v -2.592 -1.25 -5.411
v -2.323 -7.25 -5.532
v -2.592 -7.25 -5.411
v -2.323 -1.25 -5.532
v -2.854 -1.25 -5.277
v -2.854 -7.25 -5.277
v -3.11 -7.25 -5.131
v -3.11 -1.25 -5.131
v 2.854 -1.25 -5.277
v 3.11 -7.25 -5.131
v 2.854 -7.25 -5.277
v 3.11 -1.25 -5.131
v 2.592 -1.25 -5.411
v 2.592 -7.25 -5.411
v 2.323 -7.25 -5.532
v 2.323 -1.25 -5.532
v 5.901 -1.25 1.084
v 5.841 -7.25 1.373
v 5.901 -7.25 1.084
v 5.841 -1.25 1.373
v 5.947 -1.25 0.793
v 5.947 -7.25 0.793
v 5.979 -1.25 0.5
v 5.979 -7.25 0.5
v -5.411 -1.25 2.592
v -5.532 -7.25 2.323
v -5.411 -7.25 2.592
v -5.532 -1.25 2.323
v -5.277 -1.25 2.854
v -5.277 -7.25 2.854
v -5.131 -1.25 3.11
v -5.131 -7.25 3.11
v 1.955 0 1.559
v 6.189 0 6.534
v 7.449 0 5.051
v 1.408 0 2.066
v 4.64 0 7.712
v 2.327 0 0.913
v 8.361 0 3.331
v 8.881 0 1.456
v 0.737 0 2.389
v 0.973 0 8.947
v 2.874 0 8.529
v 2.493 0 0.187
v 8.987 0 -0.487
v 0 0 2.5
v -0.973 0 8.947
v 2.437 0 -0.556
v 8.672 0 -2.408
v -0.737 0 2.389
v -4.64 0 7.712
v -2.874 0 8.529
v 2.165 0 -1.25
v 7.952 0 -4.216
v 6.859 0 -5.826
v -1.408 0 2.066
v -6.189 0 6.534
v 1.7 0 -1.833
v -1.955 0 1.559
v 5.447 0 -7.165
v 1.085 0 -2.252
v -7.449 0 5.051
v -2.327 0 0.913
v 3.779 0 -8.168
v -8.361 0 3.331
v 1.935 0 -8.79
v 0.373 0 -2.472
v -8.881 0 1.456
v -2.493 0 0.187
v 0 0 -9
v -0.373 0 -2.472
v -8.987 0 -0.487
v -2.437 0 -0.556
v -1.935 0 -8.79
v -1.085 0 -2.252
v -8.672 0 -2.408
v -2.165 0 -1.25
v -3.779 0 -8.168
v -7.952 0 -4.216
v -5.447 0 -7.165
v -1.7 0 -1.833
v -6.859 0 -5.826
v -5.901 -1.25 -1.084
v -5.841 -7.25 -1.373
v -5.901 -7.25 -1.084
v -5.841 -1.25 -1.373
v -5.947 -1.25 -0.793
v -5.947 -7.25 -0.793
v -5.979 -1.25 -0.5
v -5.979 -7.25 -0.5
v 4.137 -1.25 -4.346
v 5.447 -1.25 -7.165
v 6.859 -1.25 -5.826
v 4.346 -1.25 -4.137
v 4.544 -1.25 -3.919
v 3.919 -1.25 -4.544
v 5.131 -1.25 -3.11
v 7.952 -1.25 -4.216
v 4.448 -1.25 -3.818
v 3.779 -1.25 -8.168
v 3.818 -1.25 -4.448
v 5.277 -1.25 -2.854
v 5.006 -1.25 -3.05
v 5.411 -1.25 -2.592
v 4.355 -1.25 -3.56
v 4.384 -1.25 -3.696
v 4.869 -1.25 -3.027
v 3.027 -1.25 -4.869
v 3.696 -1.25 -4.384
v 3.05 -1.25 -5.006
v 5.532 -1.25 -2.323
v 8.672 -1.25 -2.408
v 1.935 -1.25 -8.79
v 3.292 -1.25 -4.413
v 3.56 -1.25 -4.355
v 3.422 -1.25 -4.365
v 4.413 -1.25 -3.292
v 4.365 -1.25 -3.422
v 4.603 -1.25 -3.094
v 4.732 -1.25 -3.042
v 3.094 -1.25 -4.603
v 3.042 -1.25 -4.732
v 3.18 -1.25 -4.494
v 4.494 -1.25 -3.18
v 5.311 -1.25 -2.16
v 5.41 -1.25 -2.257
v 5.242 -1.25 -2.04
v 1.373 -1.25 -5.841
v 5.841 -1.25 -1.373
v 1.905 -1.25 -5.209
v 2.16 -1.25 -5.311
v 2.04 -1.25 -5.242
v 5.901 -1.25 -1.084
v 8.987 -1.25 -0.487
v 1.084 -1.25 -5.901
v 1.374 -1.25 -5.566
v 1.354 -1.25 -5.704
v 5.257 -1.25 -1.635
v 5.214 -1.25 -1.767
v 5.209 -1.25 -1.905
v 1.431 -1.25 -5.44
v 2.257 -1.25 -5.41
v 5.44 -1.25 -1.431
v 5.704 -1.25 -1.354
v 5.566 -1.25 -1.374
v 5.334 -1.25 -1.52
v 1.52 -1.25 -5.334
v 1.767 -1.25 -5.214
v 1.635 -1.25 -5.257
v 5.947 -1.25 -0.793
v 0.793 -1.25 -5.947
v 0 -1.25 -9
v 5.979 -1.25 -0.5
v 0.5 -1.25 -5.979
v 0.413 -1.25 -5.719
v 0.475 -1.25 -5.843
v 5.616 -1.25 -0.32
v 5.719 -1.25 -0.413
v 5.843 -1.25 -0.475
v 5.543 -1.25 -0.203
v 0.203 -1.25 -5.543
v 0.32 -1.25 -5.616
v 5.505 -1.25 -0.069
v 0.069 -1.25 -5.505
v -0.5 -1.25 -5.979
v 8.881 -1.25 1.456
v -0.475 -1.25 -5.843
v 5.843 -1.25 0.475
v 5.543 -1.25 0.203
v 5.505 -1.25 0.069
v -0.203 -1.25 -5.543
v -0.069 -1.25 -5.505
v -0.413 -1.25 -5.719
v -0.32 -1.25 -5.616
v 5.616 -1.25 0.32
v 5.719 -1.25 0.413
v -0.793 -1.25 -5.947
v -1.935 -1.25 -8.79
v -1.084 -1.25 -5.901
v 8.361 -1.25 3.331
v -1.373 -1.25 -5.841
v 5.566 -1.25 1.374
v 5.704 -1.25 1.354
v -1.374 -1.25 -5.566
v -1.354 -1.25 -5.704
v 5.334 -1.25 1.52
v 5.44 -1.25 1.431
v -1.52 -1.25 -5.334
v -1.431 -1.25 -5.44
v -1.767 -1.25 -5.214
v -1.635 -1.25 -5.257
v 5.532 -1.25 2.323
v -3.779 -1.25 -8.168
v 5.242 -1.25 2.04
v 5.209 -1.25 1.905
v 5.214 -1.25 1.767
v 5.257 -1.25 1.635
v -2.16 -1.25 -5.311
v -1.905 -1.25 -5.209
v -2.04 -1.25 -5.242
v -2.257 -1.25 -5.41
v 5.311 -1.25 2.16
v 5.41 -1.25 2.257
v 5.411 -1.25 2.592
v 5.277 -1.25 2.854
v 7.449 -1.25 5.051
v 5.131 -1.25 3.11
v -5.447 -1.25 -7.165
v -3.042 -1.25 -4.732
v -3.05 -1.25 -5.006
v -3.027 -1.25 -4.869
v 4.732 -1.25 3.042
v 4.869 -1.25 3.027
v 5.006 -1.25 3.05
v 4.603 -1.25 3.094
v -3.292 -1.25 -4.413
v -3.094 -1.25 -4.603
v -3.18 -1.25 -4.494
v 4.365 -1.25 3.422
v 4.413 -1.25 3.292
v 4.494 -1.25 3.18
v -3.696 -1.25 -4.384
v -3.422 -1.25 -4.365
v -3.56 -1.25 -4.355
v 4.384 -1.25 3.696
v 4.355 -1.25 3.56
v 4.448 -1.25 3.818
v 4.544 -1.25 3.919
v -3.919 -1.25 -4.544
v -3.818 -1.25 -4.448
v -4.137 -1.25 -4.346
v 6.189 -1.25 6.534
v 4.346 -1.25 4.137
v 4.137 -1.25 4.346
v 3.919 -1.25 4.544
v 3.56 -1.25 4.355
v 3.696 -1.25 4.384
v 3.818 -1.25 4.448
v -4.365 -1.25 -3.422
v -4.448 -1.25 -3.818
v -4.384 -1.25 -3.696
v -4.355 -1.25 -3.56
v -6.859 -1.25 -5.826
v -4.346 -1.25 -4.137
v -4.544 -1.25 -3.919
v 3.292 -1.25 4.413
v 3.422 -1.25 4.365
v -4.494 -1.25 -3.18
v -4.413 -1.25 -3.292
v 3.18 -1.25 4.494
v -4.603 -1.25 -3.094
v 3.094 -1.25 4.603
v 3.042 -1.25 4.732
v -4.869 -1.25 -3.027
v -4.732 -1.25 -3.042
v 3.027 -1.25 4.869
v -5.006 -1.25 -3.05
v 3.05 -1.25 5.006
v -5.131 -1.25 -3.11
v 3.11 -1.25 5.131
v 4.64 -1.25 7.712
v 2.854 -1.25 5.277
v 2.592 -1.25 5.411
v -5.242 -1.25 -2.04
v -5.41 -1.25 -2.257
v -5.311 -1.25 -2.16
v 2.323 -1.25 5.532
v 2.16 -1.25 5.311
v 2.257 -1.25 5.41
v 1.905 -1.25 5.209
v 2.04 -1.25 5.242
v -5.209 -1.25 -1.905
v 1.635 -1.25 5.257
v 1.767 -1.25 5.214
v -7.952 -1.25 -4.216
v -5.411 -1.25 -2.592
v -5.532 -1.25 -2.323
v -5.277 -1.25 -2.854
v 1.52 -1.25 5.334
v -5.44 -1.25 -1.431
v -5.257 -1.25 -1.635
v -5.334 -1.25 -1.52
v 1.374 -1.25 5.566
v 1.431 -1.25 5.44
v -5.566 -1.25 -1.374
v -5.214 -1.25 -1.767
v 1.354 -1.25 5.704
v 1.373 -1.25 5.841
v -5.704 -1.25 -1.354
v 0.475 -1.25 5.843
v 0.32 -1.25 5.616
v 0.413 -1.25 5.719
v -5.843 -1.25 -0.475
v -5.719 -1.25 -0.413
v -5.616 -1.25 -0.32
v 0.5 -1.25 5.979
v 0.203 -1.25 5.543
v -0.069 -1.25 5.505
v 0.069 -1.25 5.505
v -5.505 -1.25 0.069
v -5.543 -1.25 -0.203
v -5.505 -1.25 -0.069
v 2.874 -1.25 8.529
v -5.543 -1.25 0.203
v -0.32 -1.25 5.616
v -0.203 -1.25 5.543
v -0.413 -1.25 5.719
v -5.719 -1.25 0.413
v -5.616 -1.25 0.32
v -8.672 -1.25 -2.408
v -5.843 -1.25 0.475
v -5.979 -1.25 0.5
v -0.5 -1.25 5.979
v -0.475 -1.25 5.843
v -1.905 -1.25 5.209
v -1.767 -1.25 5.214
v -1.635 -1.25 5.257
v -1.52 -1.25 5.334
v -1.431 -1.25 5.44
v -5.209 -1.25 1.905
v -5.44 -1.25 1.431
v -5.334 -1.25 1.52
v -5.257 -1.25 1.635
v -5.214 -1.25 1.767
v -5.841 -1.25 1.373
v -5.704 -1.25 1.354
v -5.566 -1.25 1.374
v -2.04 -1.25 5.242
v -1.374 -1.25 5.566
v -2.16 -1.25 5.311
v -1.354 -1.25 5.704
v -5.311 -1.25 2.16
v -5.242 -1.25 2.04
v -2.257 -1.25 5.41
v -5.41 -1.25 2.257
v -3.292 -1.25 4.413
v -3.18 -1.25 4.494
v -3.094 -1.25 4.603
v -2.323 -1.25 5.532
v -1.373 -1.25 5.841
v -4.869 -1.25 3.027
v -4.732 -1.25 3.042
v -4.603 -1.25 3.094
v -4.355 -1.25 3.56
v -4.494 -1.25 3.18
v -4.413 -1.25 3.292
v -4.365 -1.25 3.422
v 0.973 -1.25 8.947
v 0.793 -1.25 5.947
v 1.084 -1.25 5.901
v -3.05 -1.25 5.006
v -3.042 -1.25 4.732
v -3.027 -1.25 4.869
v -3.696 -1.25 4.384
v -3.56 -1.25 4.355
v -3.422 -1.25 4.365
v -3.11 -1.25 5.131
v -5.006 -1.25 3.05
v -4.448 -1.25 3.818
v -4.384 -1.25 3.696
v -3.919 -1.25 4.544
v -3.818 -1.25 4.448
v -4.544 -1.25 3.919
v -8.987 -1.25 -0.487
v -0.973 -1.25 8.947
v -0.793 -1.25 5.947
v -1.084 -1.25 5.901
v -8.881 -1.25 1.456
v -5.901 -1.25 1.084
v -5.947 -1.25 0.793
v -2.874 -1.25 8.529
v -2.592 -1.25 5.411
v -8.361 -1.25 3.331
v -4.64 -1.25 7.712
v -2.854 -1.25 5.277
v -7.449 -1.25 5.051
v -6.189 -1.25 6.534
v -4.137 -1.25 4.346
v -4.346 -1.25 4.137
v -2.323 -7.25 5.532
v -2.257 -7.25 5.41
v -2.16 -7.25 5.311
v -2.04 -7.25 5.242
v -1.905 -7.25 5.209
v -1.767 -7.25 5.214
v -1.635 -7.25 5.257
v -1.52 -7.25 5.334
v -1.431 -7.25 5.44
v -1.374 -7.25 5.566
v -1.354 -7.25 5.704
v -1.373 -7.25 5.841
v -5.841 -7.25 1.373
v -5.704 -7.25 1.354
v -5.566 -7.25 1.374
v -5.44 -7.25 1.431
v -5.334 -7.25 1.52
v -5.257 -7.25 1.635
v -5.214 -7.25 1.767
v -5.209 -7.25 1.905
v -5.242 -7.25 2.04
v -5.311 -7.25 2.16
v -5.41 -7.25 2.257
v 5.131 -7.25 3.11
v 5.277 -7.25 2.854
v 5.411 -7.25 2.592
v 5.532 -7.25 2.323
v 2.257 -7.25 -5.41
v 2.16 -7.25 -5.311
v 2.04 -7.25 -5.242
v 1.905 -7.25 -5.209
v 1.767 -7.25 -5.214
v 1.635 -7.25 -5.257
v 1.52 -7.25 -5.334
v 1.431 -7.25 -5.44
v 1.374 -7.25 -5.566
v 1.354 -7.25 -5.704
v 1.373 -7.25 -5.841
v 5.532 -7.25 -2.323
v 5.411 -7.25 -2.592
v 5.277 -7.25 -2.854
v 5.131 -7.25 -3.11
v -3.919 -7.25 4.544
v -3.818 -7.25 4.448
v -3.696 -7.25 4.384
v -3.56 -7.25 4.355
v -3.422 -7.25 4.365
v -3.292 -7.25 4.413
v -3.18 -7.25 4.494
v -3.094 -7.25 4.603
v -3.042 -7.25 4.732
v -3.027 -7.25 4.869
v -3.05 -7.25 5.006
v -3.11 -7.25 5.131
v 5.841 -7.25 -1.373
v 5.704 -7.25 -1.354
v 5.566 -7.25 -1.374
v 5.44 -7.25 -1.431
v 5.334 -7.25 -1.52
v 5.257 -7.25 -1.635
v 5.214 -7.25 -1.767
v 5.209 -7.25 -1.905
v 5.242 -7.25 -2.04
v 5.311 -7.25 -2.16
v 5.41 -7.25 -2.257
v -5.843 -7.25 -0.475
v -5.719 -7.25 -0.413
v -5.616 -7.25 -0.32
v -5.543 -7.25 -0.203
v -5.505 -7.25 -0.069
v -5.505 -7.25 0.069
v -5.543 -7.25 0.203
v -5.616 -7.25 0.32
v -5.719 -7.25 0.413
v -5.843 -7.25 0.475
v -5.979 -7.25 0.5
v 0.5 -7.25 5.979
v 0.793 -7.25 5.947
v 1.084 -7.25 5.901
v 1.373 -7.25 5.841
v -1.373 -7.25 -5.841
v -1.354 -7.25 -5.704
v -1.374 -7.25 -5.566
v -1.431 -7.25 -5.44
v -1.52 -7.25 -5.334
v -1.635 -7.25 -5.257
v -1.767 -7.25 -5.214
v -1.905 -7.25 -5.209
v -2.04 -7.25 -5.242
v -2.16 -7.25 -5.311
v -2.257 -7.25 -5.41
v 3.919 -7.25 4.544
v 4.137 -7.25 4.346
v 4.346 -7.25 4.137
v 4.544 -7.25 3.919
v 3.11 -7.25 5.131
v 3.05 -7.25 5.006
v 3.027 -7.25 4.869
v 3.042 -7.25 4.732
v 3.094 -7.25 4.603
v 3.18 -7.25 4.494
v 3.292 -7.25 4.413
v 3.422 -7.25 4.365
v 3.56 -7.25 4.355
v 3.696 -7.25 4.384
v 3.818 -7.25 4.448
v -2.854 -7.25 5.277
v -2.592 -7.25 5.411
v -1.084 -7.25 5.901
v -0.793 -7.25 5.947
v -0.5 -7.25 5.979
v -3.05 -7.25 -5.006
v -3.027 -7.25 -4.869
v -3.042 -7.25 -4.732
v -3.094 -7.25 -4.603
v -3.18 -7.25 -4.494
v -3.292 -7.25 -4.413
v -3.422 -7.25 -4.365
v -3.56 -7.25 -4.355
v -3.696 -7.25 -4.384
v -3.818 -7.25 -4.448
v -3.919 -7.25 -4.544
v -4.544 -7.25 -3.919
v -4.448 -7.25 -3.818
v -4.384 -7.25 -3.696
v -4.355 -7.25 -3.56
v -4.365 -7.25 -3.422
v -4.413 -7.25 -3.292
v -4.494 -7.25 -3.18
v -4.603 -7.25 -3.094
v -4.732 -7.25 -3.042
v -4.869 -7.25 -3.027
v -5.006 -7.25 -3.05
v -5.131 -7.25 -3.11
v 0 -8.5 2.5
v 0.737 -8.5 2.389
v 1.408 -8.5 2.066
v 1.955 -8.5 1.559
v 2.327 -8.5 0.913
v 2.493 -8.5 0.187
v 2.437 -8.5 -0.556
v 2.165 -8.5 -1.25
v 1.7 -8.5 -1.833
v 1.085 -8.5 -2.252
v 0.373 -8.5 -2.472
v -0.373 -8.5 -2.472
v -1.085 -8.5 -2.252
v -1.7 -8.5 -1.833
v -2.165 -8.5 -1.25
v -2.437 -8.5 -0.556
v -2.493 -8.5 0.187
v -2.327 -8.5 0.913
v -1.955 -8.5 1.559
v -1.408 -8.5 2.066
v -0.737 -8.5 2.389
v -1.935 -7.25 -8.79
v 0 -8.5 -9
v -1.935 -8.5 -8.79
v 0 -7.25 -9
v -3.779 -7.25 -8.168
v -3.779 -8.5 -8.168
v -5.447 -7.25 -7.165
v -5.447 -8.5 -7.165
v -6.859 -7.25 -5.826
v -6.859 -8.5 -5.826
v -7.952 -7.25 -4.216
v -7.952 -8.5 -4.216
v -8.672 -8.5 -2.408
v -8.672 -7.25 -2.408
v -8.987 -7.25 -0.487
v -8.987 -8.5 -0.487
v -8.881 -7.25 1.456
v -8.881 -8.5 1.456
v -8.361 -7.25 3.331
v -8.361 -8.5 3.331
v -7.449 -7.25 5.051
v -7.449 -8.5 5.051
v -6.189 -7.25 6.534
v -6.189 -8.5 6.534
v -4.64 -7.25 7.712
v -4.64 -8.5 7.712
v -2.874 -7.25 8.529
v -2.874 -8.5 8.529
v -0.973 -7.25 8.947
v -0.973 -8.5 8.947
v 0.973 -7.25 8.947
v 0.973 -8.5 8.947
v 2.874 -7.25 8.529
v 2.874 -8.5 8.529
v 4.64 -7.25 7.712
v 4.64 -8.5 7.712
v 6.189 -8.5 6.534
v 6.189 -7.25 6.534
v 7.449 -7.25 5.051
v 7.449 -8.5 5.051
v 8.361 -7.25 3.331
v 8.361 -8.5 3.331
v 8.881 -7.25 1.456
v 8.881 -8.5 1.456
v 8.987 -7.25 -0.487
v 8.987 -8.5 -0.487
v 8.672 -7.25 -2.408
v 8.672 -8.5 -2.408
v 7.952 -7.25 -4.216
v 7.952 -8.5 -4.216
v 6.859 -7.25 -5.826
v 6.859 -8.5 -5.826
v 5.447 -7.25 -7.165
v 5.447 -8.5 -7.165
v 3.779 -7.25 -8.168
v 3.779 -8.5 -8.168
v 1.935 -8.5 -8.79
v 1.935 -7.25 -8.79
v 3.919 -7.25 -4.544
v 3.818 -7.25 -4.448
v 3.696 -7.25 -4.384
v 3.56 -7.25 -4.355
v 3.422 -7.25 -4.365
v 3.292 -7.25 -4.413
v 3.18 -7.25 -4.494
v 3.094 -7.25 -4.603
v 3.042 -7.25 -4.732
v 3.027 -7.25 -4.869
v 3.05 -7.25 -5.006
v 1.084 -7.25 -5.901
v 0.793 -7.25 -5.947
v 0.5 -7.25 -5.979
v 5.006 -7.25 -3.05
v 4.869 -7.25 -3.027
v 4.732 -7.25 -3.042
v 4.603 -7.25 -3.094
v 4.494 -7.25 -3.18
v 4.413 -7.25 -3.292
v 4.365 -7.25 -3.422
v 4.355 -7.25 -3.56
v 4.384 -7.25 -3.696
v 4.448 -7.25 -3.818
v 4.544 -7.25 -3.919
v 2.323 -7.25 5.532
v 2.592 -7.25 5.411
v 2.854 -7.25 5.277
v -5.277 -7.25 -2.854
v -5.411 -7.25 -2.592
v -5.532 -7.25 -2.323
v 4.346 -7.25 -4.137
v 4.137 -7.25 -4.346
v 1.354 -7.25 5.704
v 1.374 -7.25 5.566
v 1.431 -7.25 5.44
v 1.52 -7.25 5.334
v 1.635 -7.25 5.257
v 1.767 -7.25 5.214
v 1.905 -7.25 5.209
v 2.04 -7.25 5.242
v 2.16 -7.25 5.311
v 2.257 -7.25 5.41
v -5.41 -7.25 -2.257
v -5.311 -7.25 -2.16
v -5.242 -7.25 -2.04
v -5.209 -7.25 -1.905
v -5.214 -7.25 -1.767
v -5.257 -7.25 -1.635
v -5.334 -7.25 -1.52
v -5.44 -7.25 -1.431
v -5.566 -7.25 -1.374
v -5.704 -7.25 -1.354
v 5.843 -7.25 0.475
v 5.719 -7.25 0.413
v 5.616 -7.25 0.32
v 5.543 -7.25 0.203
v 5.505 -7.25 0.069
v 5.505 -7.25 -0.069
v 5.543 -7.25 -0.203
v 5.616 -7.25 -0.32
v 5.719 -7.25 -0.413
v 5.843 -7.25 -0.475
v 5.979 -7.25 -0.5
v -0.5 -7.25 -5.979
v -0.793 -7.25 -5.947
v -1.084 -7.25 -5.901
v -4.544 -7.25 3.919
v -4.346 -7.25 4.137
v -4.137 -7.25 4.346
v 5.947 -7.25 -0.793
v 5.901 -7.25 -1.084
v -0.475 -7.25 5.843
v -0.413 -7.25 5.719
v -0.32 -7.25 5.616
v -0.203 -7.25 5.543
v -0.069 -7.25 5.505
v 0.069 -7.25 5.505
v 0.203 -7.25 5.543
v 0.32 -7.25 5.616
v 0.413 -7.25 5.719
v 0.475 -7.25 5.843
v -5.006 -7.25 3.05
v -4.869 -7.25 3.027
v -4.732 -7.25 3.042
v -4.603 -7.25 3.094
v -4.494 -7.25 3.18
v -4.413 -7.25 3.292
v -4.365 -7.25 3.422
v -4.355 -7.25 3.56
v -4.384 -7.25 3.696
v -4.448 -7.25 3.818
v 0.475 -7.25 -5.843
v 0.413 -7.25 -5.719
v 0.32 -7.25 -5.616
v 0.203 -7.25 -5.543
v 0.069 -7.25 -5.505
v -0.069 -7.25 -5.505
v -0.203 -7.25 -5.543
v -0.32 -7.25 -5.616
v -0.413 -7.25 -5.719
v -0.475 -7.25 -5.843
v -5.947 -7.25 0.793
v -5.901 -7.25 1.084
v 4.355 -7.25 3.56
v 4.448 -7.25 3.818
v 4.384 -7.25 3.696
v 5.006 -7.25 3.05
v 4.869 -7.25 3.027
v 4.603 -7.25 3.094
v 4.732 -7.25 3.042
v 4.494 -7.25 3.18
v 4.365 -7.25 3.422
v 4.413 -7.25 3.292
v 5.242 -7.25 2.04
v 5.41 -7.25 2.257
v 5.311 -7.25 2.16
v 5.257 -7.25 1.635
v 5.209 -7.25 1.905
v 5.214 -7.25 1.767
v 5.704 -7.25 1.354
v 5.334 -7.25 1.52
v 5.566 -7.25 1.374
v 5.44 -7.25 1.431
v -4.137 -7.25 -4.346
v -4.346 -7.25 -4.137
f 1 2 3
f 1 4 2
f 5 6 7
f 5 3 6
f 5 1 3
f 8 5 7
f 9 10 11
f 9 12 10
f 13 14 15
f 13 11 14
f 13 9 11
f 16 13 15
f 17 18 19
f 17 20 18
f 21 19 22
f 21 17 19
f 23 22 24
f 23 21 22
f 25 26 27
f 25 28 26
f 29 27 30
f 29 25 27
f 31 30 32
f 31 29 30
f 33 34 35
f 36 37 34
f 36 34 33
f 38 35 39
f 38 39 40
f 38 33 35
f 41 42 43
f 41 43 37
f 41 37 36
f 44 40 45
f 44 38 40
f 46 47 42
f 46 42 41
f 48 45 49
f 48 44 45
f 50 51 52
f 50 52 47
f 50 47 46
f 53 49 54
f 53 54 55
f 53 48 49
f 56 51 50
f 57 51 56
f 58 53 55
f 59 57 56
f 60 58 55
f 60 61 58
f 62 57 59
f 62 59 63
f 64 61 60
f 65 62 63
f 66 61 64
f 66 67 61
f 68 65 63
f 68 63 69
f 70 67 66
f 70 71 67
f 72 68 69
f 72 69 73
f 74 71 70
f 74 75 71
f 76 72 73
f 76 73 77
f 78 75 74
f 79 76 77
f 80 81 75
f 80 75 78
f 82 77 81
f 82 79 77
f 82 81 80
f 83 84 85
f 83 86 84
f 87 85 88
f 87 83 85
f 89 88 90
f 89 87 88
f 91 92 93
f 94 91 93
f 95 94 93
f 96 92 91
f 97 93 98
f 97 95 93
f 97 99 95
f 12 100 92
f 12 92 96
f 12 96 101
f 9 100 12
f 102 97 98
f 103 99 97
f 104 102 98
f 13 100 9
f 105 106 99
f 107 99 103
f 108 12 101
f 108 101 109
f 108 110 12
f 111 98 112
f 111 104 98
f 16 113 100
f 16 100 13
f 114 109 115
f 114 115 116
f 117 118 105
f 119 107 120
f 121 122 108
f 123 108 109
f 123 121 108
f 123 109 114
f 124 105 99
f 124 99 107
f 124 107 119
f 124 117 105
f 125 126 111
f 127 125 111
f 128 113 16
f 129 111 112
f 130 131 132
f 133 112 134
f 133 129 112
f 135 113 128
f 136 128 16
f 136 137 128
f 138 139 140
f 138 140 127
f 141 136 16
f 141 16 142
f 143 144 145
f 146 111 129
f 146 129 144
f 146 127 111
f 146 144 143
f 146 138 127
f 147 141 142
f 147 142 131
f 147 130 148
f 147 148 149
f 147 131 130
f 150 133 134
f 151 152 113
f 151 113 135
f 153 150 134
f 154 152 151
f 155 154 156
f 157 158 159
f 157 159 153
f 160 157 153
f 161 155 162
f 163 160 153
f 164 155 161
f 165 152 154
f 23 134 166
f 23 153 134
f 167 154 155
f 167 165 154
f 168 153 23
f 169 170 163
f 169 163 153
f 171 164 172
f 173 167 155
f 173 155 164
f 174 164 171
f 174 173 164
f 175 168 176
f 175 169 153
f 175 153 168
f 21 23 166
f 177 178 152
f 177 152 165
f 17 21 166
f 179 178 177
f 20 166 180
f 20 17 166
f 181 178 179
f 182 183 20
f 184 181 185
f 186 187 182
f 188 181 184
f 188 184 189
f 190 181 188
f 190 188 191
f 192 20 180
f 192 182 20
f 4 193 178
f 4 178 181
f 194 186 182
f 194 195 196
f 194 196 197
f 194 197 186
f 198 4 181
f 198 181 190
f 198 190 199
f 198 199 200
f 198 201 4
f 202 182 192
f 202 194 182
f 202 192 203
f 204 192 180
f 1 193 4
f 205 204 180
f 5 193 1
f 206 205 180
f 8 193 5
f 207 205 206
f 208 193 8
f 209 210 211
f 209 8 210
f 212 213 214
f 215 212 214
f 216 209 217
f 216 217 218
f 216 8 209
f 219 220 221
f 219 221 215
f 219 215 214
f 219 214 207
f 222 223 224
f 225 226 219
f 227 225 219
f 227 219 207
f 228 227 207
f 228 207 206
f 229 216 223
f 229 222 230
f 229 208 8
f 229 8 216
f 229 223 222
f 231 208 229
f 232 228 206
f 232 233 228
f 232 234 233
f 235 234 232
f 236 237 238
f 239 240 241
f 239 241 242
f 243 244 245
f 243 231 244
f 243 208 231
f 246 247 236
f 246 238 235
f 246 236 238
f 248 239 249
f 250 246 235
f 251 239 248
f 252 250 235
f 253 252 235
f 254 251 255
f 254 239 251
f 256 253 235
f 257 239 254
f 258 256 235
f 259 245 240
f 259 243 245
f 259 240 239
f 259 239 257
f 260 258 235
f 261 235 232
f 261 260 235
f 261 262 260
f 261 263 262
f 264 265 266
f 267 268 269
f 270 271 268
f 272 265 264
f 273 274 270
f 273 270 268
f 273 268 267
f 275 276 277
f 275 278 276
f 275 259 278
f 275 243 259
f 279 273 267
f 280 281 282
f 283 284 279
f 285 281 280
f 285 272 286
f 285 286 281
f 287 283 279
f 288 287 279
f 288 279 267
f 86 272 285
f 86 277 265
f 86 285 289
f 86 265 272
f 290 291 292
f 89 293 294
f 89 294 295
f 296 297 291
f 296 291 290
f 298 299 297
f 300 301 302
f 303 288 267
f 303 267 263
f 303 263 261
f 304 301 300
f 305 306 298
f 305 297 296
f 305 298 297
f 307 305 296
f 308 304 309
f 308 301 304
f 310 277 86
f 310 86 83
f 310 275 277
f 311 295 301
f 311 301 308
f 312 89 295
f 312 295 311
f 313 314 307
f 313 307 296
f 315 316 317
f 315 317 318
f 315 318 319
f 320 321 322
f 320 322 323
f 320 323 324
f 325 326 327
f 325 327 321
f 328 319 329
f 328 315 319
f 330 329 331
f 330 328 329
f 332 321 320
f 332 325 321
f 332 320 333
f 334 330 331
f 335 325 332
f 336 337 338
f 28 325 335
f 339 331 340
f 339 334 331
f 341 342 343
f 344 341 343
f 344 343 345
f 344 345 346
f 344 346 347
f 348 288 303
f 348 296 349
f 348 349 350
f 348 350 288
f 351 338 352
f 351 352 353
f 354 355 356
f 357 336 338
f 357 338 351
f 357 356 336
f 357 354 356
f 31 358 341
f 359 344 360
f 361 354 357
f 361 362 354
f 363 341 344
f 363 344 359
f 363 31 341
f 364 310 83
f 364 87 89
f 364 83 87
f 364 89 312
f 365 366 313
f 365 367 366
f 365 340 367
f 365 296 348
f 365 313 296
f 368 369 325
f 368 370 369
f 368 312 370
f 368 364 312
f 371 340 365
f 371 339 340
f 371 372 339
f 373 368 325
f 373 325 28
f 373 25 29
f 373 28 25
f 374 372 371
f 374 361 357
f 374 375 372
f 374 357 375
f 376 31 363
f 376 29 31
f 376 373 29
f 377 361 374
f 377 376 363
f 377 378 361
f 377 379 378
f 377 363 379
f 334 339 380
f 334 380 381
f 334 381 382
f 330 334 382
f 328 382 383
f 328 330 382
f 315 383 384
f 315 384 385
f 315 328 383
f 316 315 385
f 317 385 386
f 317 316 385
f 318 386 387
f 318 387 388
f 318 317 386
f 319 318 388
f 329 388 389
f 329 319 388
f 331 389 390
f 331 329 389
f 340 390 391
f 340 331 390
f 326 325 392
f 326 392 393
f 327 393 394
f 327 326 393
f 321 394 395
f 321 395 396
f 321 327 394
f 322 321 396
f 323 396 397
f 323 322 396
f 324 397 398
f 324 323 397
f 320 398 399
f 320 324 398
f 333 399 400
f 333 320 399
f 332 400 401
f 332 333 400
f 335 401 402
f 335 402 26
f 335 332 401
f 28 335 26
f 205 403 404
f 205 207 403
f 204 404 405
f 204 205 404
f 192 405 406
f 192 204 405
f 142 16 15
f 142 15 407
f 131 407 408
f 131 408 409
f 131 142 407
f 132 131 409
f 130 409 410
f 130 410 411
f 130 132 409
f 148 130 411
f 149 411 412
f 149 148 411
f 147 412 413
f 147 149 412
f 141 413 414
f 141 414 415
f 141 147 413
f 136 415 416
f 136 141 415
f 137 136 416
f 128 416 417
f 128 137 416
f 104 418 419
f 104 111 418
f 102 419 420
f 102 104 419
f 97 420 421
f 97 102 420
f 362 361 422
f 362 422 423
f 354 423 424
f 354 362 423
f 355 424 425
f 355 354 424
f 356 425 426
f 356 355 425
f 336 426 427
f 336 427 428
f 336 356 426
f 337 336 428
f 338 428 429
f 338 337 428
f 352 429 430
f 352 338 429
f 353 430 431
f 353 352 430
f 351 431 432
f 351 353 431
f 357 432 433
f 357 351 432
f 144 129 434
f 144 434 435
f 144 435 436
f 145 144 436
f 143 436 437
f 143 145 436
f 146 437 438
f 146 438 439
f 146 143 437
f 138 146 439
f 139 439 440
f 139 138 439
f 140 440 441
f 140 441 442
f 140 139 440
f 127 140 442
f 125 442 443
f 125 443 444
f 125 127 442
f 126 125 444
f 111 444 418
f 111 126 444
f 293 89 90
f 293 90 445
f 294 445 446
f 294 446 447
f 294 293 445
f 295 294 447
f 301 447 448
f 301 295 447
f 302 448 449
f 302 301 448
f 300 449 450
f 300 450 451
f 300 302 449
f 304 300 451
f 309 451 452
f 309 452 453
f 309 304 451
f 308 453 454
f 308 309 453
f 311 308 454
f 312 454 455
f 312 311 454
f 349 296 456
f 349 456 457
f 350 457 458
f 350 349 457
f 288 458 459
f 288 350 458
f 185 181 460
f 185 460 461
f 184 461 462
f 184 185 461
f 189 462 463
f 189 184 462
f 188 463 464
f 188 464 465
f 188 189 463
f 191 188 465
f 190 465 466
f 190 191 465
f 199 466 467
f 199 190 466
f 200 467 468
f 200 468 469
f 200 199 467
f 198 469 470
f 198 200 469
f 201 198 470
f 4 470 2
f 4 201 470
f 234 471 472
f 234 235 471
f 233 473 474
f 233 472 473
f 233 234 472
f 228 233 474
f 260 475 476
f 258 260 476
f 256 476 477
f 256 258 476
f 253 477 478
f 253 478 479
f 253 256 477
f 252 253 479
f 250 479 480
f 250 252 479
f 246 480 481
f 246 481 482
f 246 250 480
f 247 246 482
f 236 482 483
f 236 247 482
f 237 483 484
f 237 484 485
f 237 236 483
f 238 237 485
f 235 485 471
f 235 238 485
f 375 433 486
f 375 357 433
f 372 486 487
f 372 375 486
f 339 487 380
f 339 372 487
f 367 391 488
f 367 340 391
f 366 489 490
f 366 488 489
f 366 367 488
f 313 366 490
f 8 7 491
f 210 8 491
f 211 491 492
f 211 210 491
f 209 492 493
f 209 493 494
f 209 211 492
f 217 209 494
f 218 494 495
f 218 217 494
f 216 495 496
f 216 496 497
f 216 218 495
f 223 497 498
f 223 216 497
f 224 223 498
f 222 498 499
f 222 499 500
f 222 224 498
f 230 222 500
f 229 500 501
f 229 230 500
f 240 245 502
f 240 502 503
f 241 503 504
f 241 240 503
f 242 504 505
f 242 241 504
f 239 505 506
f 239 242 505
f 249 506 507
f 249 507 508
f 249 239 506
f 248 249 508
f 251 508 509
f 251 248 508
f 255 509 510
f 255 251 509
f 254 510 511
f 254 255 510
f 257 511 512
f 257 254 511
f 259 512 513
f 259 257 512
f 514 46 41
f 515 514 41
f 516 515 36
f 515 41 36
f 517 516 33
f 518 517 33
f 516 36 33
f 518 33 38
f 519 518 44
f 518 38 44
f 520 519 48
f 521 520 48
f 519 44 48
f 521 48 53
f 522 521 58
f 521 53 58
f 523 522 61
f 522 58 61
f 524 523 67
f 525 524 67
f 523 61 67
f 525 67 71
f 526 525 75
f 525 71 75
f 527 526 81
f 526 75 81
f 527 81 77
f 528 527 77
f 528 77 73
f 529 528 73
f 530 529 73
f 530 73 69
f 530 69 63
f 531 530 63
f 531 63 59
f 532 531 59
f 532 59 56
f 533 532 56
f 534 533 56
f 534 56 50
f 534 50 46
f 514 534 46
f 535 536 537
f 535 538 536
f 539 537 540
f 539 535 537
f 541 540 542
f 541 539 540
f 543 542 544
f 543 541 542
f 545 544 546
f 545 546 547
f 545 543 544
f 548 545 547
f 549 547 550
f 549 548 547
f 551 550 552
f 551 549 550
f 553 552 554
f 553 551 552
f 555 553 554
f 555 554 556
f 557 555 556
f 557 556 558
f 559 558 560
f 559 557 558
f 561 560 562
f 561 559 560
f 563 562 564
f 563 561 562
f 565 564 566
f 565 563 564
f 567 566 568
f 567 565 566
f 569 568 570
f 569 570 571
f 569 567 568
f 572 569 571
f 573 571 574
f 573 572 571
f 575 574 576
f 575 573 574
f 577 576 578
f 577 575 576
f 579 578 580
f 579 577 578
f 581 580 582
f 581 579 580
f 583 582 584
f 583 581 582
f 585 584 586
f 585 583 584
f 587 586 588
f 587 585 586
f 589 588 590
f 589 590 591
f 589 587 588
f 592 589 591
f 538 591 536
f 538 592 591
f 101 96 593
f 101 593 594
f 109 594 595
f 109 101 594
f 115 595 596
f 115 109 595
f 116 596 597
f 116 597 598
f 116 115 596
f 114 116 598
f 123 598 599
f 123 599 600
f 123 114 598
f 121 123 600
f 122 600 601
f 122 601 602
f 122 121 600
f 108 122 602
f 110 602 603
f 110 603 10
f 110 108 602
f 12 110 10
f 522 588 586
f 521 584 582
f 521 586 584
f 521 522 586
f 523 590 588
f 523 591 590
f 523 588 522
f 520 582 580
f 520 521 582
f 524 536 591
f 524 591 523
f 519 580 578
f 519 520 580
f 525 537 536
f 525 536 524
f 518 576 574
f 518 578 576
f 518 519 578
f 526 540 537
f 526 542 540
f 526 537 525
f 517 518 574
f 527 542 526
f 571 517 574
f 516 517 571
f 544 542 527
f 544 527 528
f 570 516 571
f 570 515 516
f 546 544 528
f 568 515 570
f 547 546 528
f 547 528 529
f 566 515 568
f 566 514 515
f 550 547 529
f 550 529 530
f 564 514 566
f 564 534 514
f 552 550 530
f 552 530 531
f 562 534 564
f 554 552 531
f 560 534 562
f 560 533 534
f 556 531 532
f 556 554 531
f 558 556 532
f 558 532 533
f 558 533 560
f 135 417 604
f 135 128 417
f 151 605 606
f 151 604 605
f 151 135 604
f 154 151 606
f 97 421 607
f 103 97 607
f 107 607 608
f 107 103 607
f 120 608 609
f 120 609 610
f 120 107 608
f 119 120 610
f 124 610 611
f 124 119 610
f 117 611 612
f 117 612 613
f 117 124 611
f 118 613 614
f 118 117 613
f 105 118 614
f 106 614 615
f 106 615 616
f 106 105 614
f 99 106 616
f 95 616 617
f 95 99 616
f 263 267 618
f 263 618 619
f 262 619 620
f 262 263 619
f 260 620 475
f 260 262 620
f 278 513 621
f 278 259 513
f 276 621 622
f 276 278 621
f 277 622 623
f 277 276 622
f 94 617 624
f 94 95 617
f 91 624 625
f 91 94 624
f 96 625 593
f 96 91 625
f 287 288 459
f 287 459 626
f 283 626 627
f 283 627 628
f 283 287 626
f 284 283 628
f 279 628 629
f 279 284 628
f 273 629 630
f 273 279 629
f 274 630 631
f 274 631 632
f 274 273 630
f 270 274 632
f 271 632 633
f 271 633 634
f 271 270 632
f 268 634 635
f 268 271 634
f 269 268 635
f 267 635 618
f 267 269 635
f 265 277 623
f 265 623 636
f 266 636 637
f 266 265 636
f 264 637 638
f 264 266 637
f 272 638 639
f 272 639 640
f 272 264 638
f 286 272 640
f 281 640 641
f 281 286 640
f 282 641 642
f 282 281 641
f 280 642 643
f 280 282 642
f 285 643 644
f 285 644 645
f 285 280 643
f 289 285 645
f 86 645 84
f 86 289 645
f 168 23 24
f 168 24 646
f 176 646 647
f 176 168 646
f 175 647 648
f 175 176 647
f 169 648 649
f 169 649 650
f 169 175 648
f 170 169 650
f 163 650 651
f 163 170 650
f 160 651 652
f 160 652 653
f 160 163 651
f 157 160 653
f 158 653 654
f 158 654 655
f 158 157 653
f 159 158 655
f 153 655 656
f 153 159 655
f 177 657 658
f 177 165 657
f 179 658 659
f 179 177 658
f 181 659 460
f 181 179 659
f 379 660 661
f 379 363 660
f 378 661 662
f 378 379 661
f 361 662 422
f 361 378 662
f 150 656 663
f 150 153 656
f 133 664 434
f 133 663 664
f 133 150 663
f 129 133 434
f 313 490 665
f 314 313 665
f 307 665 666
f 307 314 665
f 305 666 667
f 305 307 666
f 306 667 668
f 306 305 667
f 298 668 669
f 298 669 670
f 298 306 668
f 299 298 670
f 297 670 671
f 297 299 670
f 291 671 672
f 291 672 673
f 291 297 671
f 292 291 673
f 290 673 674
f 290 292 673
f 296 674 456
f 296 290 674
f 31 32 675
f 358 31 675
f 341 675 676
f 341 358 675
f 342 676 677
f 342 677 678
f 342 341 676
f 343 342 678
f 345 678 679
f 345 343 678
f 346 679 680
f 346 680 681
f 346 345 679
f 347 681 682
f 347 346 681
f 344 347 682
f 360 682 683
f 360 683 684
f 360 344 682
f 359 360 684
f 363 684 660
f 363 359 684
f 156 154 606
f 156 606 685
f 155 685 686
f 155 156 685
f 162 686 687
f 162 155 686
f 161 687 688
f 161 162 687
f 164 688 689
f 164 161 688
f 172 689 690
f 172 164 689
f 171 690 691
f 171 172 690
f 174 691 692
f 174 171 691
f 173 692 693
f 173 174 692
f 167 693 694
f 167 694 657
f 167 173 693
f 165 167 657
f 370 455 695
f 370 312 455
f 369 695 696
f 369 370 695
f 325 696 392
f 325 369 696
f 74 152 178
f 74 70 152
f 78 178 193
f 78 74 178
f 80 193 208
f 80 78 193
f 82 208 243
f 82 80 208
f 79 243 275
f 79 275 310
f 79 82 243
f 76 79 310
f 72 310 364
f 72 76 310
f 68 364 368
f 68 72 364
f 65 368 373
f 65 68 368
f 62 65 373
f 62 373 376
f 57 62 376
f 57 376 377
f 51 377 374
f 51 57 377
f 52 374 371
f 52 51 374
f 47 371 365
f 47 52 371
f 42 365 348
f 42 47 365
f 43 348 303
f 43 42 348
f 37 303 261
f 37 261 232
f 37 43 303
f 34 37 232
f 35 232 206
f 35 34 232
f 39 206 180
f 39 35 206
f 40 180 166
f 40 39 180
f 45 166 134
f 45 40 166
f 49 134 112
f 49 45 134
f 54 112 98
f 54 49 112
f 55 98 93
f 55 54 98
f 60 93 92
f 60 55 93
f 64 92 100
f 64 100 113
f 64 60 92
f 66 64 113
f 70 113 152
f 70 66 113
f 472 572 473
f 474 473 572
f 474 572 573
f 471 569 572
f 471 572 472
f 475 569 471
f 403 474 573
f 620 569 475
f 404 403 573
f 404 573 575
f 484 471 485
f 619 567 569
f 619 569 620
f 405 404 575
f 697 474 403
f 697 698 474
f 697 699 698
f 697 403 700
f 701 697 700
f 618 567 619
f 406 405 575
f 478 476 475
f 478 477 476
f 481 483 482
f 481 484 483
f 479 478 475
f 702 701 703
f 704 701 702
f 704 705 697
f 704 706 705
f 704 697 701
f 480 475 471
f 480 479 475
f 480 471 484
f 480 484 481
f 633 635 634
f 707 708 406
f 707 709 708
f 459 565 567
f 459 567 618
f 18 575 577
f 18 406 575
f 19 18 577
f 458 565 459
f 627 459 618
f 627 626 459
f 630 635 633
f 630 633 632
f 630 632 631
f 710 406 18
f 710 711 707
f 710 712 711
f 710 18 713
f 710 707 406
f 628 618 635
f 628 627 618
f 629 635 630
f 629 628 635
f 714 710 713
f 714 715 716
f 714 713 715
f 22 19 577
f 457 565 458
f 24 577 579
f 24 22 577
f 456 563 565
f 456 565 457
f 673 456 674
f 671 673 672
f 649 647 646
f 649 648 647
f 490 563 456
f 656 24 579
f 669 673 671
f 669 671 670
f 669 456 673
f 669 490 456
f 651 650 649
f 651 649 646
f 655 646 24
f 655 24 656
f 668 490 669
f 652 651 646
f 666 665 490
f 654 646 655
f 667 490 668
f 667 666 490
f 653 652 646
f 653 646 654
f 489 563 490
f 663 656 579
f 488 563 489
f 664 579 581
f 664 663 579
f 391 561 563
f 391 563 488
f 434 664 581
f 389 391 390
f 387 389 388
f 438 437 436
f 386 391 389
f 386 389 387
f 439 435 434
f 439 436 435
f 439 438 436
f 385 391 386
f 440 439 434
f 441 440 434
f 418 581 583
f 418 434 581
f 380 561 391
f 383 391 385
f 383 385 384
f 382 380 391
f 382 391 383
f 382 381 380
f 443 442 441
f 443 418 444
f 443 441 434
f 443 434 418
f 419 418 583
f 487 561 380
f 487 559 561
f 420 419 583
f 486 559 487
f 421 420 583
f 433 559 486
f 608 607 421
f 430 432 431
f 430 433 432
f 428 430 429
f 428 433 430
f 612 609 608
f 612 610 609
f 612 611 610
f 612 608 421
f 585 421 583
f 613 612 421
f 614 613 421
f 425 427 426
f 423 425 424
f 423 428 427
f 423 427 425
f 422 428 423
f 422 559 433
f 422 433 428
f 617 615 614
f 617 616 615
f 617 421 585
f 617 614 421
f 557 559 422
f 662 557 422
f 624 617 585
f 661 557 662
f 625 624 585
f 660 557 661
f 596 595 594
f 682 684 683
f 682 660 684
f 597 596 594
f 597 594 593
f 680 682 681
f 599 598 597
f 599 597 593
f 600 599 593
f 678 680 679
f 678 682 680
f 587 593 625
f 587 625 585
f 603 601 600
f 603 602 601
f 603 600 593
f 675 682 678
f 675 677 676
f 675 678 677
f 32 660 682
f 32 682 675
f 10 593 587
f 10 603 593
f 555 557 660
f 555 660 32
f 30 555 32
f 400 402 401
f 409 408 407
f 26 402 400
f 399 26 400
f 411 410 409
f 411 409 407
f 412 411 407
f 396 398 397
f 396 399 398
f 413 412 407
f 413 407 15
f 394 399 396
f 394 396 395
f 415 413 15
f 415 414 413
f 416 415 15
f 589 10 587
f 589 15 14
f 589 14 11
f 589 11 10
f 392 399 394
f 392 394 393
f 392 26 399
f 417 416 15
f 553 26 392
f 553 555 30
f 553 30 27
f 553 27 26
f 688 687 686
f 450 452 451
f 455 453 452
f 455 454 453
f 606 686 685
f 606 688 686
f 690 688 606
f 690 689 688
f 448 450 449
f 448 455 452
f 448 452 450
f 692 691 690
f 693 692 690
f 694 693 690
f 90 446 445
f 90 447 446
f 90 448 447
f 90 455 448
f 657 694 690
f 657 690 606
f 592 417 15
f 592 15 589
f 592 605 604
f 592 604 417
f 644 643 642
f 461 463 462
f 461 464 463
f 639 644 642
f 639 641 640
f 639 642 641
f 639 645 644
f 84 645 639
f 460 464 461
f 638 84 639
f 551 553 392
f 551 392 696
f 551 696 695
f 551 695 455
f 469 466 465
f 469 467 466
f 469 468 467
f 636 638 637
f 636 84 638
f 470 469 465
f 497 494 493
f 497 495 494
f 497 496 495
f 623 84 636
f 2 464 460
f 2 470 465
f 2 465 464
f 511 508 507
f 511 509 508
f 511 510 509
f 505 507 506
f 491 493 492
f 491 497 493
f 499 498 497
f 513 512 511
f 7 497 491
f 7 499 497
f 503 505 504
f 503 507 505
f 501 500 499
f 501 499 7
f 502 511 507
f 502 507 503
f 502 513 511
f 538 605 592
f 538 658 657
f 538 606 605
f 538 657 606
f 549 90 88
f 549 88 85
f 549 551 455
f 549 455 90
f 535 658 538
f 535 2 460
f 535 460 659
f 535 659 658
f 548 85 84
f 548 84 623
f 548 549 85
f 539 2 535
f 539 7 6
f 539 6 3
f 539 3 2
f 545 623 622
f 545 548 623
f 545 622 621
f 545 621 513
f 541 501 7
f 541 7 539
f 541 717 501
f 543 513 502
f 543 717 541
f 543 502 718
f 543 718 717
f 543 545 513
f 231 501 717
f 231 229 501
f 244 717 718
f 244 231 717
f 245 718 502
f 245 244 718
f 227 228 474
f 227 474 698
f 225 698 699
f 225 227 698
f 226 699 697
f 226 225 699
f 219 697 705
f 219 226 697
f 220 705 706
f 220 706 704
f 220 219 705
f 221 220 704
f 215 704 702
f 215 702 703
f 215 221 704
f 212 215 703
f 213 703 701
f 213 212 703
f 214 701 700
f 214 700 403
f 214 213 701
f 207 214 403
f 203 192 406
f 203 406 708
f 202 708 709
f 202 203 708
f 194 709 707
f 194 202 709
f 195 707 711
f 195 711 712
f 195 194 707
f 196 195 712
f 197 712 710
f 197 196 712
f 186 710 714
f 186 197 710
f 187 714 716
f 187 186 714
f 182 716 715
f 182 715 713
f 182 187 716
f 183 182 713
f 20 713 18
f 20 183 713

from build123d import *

# Parameters (mm, degrees)
SKETCH_2_R               = 2.5
CUT_EXTRUDE_1_DEPTH      = 10
SKETCH_5_R               = 0.5
CUT_EXTRUDE_3_DEPTH      = 6
PATTERN_CIRCULAR_2_COUNT = 20


with BuildPart() as part:
    # 草图1 → 旋转1 (revolve)
    with BuildSketch(Plane.XY, mode=Mode.PRIVATE) as revolve_1_sk:
        Polygon((0, -8.5), (-9, -8.5), (-9, -7.25), (-6, -7.25), (-6, -1.25), (-9, -1.25), (-9, 0), (0, 0), align=None)
    revolve(revolve_1_sk.sketch.rotate(Axis((0, 0, 0), (0, 1, 0)), 270), axis=Axis((0, 0, 0), (0, 1, 0)))

    # 草图2 → 切除-拉伸1 (cut)
    with BuildSketch(Plane(origin=(0, 0, 0), x_dir=(1, 0, 0), z_dir=(0, 1, 0))):
        with Locations(Location((0, 0, 0), (0, 0, 270))):
            Circle(SKETCH_2_R)
    extrude(amount=-CUT_EXTRUDE_1_DEPTH, mode=Mode.SUBTRACT)

    # 草图5 → 切除-拉伸3 (cut)
    with BuildSketch(Plane.XZ.offset(1.25)):
        with Locations((0, 6)):
            Circle(SKETCH_5_R)
    cut_extrude_3 = extrude(amount=CUT_EXTRUDE_3_DEPTH, mode=Mode.SUBTRACT)

    # 阵列(圆周)2: 切除-拉伸3 ×20 about axis
    pattern_circular_2_axis = Axis((0, 0, 0), (0, 1, 0))
    for i in range(1, PATTERN_CIRCULAR_2_COUNT):
        add(cut_extrude_3.rotate(pattern_circular_2_axis, i * 360 / PATTERN_CIRCULAR_2_COUNT), mode=Mode.SUBTRACT)


solid = part.part
